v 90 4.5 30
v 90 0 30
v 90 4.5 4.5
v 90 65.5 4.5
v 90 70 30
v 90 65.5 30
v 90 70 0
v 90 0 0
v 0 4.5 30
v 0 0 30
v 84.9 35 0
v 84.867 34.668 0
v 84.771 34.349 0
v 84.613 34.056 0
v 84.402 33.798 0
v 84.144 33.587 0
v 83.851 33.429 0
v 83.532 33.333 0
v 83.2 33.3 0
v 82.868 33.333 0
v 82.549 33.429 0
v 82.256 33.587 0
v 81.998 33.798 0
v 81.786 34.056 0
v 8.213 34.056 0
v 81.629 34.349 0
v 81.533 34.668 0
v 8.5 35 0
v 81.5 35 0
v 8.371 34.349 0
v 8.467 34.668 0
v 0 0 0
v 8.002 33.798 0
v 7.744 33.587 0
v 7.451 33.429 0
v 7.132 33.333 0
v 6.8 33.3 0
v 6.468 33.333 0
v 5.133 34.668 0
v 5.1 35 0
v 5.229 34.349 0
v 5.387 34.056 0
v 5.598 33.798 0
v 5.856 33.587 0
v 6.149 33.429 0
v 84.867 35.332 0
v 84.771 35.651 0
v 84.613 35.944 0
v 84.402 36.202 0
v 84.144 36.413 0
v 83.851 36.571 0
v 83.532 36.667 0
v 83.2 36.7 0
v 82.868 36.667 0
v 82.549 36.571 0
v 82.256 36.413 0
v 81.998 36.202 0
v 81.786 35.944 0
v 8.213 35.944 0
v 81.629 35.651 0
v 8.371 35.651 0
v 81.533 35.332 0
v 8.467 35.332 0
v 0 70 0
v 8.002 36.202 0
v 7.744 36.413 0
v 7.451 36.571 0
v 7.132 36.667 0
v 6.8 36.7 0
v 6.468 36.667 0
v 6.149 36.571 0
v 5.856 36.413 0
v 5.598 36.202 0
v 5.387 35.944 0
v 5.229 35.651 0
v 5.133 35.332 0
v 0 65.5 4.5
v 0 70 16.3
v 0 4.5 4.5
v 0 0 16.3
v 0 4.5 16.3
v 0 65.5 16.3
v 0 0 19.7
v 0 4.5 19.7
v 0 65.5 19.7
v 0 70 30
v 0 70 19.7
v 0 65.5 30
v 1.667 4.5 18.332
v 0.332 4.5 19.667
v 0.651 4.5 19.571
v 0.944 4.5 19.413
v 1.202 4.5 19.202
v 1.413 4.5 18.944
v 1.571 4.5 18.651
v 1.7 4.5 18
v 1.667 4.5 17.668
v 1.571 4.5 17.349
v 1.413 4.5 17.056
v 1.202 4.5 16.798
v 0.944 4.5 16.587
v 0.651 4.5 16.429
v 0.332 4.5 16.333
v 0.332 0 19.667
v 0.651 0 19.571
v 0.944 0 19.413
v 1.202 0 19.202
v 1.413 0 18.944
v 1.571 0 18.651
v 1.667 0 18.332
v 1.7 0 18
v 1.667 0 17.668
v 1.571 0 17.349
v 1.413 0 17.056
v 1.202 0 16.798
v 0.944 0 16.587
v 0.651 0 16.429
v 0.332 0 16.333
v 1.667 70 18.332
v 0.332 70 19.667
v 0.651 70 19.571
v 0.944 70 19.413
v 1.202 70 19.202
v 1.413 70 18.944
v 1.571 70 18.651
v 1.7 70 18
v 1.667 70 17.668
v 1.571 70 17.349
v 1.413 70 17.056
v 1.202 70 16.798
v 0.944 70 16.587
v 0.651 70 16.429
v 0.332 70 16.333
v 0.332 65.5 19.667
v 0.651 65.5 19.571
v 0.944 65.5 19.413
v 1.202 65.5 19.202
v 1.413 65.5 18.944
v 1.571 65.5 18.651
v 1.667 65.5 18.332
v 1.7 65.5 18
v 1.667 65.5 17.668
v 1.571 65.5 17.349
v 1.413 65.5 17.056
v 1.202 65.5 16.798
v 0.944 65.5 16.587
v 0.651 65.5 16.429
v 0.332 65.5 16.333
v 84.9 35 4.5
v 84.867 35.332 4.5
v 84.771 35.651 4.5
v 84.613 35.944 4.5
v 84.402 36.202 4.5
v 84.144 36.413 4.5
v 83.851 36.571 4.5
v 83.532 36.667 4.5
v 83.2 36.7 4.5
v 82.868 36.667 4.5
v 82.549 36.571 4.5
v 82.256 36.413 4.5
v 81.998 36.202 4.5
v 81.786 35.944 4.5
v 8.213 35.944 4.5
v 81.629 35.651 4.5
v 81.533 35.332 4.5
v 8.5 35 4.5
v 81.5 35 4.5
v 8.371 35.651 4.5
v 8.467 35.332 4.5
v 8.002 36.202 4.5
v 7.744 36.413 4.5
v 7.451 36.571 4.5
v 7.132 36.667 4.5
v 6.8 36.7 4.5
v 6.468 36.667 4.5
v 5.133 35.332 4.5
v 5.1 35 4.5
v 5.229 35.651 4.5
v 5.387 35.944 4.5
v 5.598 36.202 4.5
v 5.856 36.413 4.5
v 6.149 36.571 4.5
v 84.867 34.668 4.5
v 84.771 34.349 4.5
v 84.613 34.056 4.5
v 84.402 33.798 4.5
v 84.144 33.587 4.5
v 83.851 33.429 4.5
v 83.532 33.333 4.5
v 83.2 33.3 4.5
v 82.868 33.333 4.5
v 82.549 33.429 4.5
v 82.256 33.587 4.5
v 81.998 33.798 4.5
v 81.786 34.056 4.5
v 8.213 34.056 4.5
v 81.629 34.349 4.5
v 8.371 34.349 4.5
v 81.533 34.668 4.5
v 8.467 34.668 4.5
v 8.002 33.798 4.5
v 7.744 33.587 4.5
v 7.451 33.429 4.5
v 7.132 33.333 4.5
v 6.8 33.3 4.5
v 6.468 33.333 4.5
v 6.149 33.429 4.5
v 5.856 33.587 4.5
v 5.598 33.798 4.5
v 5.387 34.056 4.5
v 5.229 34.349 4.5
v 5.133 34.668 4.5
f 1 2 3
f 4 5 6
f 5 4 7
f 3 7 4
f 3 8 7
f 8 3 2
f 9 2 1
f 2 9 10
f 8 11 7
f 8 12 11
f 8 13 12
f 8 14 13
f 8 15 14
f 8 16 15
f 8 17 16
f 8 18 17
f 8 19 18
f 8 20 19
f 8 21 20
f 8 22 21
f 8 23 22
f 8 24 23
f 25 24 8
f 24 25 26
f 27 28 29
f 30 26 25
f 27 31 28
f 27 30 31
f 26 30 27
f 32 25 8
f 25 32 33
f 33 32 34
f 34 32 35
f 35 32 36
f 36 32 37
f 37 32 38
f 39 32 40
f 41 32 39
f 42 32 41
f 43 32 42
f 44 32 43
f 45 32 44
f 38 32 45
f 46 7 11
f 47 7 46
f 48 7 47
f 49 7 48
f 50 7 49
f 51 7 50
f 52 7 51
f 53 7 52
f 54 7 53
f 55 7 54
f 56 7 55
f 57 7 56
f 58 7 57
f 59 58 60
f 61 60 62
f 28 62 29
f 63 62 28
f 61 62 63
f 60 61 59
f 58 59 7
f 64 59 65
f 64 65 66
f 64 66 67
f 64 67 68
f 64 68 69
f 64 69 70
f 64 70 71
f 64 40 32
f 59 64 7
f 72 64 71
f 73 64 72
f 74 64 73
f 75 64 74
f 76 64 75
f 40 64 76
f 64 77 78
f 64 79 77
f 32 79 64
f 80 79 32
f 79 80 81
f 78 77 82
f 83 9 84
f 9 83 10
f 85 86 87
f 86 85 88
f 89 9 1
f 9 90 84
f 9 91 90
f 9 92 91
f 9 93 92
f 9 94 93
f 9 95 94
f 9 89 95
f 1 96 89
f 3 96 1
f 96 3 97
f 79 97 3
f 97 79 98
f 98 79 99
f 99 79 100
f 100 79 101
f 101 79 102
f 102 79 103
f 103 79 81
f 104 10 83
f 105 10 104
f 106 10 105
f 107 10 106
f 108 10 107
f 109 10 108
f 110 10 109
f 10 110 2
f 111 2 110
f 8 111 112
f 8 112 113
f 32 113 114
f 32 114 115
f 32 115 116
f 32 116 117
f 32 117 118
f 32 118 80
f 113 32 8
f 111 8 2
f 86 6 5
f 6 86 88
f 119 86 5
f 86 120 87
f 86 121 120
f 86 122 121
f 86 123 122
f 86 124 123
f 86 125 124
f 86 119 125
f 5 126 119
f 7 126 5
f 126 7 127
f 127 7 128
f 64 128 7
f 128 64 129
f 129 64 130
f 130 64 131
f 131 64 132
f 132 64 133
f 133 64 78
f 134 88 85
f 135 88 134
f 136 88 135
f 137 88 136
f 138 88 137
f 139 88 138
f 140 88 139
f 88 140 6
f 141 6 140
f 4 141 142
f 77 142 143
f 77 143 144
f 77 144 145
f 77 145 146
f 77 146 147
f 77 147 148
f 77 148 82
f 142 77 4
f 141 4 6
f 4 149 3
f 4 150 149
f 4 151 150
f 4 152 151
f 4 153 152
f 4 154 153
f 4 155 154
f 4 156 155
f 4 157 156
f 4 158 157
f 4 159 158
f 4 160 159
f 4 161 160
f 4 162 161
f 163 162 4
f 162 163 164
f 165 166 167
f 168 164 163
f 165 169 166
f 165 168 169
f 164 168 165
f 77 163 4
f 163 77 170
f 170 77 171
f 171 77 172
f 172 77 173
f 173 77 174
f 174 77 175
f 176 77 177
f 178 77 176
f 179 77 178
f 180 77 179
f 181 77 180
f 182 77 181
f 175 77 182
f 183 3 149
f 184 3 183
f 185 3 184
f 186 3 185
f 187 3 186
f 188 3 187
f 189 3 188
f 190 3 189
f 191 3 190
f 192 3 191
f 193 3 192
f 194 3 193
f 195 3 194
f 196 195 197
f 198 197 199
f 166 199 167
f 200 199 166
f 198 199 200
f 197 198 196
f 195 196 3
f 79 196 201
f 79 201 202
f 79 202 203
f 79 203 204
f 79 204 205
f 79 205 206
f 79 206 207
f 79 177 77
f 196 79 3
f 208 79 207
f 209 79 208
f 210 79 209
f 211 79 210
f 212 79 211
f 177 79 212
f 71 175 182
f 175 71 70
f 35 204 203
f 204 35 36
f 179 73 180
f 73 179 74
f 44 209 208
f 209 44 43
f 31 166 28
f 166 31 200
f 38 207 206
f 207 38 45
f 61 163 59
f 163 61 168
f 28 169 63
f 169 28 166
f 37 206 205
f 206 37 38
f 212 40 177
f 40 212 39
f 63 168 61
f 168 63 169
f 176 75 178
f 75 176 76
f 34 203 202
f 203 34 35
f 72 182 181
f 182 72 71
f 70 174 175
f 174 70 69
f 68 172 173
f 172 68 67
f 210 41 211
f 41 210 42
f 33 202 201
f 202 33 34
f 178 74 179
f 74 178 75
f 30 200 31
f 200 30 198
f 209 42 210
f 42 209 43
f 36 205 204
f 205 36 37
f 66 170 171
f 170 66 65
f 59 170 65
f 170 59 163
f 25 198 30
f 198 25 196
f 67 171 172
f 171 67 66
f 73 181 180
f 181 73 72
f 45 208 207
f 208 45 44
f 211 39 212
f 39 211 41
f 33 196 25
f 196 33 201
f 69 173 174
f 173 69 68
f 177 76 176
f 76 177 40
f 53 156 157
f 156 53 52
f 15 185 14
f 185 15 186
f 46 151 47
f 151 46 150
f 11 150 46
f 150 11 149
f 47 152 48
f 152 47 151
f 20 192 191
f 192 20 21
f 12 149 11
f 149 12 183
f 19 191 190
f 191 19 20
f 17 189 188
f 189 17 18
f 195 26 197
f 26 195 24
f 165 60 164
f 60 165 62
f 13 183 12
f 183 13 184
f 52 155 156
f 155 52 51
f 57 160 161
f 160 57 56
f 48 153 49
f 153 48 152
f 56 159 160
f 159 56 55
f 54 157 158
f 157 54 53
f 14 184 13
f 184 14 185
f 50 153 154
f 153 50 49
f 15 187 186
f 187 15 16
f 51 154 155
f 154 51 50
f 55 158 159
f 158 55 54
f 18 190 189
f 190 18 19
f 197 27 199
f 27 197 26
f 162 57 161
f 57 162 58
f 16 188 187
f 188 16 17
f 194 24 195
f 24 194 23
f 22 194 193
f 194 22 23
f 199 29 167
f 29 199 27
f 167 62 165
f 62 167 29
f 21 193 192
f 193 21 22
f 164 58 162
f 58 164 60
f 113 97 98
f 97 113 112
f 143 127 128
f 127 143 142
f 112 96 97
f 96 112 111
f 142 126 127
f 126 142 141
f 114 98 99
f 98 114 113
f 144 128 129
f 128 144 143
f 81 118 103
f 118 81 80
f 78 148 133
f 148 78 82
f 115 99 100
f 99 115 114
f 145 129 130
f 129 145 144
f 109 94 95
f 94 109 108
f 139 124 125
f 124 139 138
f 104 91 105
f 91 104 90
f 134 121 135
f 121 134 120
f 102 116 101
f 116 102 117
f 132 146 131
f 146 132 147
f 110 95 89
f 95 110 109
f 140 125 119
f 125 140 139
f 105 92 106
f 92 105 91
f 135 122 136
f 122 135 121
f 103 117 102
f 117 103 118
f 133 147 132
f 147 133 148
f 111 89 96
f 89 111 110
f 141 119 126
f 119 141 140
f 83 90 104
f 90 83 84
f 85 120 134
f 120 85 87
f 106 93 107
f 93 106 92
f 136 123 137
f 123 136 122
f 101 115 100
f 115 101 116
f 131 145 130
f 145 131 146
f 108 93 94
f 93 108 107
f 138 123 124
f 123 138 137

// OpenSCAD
$fn = 32;

// ----------------------------------------------------------------------
// U-bracket: 90 x 70 x 30 mm
// ----------------------------------------------------------------------

// --- parameters (mm) ---
rail_len = 90;            // outer length, X
jaw_w = 70;               // outer width, Y
jaw_h = 30;               // upright height, Z
web_t = 4.5;              // wall thickness
hole_d = 3.4;             // clearance for M3

module hole_z(px, py) {
  translate([px, py, -0.5]) cylinder(h = web_t + 1, d = hole_d);
}
module hole_y_pz(pz) {
  /* through both uprights along Y */
  translate([0, -0.5, pz]) rotate([-90, 0, 0]) cylinder(h = jaw_w + 1, d = hole_d);
}

module base() {
  cube([rail_len, jaw_w, web_t]);
}

module uprights() {
  cube([rail_len, web_t, jaw_h]);
  translate([0, jaw_w - web_t, 0]) cube([rail_len, web_t, jaw_h]);
}

difference() {
  union() {
    base();
    uprights();
  }
  hole_z(6.8, 35);
  hole_z(83.2, 35);
  hole_y_pz(18);
}
